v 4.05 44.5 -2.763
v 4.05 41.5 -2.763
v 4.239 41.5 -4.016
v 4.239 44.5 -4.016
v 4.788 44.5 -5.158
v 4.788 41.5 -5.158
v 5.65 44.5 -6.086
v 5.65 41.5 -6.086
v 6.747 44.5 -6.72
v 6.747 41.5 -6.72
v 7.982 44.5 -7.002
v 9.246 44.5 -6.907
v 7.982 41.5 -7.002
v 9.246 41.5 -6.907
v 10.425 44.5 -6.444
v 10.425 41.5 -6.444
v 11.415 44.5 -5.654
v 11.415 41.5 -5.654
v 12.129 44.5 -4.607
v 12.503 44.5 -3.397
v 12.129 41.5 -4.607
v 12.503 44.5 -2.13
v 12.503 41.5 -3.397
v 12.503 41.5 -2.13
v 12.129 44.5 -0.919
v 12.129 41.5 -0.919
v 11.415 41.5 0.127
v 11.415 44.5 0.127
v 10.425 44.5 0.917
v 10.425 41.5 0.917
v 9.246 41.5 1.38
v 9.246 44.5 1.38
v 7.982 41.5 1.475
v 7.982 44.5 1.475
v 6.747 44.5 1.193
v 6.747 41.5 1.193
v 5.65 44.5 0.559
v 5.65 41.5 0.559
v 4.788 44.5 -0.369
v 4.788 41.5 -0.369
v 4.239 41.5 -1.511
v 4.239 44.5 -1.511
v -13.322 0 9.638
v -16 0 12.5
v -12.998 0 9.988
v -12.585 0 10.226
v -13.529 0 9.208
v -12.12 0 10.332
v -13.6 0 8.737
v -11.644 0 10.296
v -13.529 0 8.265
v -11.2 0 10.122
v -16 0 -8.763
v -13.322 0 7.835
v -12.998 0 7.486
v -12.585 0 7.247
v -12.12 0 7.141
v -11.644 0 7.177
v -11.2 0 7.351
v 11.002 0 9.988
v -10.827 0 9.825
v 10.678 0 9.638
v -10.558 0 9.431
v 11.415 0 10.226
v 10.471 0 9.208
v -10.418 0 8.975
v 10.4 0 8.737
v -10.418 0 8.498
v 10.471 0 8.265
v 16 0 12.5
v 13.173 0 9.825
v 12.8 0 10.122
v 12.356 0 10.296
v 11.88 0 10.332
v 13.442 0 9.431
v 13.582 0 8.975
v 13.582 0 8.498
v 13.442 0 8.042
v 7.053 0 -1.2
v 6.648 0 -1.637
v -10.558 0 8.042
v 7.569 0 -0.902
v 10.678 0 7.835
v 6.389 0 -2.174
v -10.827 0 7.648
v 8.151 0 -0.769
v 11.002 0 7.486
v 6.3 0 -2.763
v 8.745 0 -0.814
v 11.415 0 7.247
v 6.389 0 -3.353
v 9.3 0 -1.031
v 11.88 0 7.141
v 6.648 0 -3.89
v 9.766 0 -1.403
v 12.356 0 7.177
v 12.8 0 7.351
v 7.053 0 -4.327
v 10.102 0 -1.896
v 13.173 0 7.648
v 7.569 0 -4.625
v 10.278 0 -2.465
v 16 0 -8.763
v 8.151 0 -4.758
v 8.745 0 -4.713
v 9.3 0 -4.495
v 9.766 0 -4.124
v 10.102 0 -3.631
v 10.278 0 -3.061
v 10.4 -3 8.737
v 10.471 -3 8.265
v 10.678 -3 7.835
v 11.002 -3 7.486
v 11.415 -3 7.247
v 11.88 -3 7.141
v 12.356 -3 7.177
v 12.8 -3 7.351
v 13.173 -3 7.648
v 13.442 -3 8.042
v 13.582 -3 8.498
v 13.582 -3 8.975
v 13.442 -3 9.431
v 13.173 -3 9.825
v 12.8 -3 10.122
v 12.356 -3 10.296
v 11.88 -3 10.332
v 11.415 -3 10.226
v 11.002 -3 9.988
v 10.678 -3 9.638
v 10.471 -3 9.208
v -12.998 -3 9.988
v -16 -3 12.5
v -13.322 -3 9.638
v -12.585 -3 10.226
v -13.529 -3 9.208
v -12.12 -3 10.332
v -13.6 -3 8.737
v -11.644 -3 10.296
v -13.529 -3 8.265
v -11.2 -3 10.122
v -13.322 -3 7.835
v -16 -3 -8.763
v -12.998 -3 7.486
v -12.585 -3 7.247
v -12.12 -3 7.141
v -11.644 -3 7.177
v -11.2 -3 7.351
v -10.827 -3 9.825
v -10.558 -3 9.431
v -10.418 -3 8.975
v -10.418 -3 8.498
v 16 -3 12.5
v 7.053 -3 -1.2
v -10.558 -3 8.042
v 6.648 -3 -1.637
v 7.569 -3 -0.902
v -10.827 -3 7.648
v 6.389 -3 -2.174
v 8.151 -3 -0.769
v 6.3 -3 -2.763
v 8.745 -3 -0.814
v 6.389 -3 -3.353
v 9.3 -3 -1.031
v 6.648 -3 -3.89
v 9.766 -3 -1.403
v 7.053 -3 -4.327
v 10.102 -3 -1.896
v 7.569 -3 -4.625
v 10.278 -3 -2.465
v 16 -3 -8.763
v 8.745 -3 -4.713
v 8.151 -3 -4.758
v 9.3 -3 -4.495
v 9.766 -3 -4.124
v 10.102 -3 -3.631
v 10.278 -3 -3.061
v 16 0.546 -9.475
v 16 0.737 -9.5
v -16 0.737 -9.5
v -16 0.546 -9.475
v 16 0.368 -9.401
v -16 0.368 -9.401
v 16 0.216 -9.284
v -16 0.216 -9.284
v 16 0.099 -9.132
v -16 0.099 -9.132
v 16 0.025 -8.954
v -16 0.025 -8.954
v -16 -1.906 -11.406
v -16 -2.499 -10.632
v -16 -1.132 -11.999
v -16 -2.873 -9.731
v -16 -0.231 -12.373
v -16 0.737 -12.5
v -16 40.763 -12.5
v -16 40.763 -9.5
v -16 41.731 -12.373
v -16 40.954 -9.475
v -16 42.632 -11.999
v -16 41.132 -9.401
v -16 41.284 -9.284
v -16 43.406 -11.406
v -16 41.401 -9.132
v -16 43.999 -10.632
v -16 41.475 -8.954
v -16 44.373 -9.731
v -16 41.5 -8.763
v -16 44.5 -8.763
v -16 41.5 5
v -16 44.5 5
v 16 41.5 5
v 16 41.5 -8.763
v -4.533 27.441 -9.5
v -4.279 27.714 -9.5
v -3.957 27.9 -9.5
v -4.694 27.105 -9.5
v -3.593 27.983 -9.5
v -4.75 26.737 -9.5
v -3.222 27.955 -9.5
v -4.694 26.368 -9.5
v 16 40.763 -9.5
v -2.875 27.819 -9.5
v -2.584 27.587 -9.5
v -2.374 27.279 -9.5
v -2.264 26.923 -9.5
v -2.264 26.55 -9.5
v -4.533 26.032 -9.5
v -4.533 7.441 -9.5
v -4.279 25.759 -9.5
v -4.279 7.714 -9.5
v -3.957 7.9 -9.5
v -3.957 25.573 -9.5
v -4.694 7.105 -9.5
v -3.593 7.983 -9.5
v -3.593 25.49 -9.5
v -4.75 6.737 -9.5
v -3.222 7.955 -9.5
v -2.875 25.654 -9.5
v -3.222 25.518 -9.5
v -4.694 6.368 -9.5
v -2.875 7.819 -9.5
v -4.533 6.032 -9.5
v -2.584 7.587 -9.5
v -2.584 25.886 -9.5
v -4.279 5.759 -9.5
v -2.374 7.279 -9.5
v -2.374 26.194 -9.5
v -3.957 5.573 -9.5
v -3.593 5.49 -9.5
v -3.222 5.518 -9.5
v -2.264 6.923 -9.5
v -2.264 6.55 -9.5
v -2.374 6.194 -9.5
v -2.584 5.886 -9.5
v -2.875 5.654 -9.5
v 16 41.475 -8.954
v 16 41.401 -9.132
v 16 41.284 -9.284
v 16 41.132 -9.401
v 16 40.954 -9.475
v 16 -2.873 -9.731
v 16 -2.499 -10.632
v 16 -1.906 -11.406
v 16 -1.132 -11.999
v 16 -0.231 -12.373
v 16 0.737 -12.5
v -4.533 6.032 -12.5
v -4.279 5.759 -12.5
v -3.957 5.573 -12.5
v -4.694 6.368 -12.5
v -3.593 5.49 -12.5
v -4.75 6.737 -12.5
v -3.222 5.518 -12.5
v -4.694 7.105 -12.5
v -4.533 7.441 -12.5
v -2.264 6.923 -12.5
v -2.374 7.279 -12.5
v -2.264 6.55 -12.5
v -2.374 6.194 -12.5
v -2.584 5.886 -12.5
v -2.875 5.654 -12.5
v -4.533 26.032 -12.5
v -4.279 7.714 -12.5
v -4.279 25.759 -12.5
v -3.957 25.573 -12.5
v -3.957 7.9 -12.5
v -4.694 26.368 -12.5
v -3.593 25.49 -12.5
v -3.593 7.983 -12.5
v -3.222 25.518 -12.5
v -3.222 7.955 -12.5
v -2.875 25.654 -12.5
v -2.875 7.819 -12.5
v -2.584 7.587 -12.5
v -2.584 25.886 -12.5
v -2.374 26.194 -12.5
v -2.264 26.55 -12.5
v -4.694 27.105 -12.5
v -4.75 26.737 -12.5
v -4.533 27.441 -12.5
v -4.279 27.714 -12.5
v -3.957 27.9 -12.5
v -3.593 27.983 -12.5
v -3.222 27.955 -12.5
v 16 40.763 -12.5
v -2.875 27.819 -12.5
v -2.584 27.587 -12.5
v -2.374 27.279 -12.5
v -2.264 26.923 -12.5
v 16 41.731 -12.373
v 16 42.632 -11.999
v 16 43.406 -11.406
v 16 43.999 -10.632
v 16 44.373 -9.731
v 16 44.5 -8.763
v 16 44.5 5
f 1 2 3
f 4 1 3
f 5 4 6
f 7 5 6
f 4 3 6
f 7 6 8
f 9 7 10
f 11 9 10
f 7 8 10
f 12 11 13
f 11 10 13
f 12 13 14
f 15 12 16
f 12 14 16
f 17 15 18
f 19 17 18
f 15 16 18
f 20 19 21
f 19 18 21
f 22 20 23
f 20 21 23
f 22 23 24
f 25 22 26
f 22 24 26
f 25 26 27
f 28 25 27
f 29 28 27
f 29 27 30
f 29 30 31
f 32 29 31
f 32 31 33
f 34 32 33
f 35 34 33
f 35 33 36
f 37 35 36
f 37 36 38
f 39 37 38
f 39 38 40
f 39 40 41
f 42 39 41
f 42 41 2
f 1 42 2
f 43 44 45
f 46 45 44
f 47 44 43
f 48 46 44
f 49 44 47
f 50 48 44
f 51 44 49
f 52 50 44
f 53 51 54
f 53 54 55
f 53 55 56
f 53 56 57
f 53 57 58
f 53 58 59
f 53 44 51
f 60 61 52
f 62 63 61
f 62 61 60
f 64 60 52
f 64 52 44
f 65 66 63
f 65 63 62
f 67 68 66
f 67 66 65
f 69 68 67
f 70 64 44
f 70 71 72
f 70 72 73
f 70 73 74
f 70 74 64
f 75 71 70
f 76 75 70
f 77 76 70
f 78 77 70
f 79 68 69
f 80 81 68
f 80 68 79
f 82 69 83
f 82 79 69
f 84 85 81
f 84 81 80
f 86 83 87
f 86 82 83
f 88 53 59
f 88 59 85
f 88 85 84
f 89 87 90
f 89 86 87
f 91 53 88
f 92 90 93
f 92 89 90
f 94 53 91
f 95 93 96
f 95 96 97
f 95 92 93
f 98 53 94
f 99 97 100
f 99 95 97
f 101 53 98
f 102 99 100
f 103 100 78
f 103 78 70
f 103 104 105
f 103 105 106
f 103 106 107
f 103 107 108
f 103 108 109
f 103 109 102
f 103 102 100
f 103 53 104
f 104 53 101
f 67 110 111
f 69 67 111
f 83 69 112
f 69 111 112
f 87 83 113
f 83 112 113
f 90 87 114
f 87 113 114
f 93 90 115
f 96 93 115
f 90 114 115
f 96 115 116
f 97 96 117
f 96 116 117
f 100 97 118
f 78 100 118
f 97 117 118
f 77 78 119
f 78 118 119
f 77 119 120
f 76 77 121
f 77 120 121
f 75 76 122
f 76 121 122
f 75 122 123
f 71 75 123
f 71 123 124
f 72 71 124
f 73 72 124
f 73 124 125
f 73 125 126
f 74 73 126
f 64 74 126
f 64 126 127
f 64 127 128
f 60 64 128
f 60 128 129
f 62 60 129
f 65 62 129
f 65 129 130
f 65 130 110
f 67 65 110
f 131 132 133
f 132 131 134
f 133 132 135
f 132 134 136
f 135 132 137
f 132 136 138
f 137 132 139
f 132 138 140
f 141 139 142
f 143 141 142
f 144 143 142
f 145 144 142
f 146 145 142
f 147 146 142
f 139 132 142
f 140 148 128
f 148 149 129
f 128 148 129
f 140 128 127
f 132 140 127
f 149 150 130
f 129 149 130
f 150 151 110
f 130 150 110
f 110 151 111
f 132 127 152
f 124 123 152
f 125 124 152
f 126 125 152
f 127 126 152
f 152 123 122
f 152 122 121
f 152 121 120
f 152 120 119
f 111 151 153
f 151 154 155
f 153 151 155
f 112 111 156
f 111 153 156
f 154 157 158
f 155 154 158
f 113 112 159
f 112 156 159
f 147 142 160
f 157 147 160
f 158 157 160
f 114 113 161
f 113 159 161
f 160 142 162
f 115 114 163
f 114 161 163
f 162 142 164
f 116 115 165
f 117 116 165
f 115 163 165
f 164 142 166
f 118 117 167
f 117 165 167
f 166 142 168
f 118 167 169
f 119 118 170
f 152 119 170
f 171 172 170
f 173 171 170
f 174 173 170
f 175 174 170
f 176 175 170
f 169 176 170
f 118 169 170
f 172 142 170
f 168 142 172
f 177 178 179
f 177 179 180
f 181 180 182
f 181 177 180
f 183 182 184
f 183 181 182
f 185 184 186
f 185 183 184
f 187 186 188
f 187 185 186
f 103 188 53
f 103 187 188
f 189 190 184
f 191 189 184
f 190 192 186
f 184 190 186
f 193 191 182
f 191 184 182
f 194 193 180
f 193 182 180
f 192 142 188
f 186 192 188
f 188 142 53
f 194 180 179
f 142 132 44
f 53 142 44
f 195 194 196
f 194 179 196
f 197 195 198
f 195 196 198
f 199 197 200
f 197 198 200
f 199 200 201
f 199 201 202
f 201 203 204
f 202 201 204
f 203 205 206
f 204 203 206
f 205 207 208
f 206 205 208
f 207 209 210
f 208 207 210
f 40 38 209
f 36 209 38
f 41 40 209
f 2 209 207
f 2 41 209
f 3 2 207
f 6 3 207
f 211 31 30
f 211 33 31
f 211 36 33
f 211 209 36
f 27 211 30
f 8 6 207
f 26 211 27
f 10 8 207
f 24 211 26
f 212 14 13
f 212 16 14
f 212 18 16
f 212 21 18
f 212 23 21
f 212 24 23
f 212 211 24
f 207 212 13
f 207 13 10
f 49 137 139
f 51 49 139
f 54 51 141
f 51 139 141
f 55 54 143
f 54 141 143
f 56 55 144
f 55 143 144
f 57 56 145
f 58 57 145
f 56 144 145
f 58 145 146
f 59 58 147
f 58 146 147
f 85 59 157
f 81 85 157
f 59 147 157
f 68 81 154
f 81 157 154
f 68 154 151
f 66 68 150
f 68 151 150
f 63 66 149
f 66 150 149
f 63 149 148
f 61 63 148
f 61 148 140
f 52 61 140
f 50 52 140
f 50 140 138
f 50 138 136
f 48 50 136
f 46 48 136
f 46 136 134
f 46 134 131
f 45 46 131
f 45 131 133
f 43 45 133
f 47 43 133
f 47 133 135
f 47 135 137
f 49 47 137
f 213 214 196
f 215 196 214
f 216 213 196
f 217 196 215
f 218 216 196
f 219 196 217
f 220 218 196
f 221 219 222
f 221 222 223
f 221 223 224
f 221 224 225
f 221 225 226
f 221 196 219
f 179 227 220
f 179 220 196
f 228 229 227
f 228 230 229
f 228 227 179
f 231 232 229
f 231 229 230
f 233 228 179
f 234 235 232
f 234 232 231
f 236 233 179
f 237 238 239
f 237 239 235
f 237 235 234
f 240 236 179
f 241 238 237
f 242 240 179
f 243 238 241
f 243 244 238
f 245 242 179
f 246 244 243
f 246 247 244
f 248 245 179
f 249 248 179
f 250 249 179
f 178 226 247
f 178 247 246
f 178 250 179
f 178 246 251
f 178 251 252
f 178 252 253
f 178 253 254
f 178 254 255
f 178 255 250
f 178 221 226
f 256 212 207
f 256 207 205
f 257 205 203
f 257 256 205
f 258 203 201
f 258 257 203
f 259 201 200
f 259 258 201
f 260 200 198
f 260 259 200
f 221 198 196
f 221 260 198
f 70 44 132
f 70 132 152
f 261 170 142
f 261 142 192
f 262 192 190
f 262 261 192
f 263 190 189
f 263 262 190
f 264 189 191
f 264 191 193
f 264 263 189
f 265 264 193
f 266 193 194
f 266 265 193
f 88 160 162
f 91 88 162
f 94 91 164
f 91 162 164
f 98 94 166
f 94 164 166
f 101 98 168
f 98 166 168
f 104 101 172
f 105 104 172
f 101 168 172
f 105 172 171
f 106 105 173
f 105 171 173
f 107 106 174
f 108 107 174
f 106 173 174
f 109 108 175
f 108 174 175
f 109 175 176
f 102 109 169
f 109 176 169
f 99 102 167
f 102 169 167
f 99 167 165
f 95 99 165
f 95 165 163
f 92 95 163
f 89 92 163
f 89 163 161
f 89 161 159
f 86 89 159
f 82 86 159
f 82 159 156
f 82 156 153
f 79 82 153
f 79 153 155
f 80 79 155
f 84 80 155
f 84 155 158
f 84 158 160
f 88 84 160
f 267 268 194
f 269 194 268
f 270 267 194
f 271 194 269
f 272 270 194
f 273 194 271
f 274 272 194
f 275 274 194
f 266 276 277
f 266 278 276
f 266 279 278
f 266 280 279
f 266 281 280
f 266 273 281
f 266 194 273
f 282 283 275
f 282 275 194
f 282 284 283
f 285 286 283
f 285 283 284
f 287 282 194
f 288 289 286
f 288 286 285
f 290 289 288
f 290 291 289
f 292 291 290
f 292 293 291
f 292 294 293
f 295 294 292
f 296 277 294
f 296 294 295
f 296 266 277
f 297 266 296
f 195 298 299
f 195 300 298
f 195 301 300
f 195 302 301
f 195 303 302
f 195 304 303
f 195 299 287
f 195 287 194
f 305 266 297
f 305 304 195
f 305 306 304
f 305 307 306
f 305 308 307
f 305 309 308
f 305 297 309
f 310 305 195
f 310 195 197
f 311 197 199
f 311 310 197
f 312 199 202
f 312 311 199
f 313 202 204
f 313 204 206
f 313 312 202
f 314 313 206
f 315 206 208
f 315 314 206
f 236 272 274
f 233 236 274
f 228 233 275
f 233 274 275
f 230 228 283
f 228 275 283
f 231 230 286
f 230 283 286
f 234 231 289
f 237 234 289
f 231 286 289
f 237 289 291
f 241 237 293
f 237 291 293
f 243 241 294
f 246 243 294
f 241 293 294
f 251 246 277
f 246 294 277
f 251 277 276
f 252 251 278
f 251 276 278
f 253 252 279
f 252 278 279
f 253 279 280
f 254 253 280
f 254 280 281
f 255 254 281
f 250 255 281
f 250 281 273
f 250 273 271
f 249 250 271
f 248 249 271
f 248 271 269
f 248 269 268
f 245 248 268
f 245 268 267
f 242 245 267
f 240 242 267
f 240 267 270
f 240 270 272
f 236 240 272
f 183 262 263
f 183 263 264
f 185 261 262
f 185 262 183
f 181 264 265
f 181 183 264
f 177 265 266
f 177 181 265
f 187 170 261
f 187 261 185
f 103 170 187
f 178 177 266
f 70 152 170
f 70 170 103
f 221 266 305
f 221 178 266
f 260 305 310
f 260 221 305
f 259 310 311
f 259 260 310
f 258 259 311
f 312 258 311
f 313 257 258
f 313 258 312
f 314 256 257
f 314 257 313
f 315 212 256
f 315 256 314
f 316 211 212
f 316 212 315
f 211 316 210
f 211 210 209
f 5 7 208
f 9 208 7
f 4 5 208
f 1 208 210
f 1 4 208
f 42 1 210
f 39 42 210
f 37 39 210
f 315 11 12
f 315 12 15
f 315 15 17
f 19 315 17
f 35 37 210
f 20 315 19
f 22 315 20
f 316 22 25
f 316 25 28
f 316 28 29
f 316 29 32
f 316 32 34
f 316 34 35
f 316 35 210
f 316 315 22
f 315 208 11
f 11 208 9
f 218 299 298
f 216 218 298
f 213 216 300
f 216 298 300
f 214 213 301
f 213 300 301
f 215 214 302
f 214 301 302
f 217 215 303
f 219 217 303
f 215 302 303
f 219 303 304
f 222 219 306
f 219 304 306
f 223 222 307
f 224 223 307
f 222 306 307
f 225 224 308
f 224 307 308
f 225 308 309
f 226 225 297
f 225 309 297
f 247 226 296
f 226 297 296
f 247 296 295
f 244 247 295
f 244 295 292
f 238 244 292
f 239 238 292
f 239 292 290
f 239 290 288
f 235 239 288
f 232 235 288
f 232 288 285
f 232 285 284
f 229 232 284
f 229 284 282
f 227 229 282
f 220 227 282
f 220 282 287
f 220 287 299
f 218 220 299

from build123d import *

# Parameters (mm, degrees)
SKETCH1_W                        = 32
SKETCH1_H                        = 25
BASE_FLANGE1_DEPTH               = 3
EDGE_FLANGE1_STRIP_W             = 13.4732
EDGE_FLANGE1_STRIP_H             = 3
EDGE_FLANGE1_STRIP_CUT_DEPTH     = 32
EDGE_FLANGE1_DEPTH               = 32
EDGE_FLANGE2_STRIP_W             = 13.4732
EDGE_FLANGE2_STRIP_H             = 3
EDGE_FLANGE2_STRIP_CUT_DEPTH     = 32
EDGE_FLANGE2_DEPTH               = 32
TAP_DRILL_FOR_M3X0_5_TAP1_D      = 2.5
TAP_DRILL_FOR_M10X1_5_TAP2_D     = 8.5
TAP_DRILL_FOR_M10X1_5_TAP2_DEPTH = 3
M3_CLEARANCE_HOLE1_D             = 3.2
F_4_0_4_DIAMETER_HOLE1_D         = 4


# Sheet-metal steps are written as plain solids
with BuildPart() as part:
    # Sketch1 → Base-Flange1 (new body)
    with BuildSketch(Plane(origin=(0, 0, 0), x_dir=(1, 0, 0), z_dir=(0, 1, 0))):
        Rectangle(SKETCH1_W, SKETCH1_H)
    extrude(amount=-BASE_FLANGE1_DEPTH)

    # Edge-Flange1 strip (across the edge) → Edge-Flange1 strip cut (cut)
    with BuildSketch(Plane(origin=(16, 0, -12.5), x_dir=(0, 0, 1), z_dir=(-1, 0, 0))):
        with Locations((-3, -1.5)):
            Rectangle(EDGE_FLANGE1_STRIP_W, EDGE_FLANGE1_STRIP_H)
    extrude(amount=EDGE_FLANGE1_STRIP_CUT_DEPTH, mode=Mode.SUBTRACT)

    # Edge-Flange1 section (across the edge) → Edge-Flange1 (add)
    with BuildSketch(Plane(origin=(16, 0, -12.5), x_dir=(0, 0, 1), z_dir=(-1, 0, 0))):
        with BuildLine():
            Line((0, 0.7366), (0, 44.5))
            Line((0, 44.5), (3, 44.5))
            Line((3, 44.5), (3, 0.7366))
            ThreePointArc((3, 0.7366), (3.215745145, 0.215745145), (3.7366, 0))
            Line((3.7366, 0), (3.7366, -3))
            ThreePointArc((3.7366, -3), (1.094424801, -1.905575199), (0, 0.7366))
        make_face()
    extrude(amount=EDGE_FLANGE1_DEPTH)

    # Edge-Flange2 strip (across the edge) → Edge-Flange2 strip cut (cut)
    with BuildSketch(Plane(origin=(16, 44.5, -9.5), x_dir=(0, -1, 0), z_dir=(-1, 0, 0))):
        with Locations((-3, -1.5)):
            Rectangle(EDGE_FLANGE2_STRIP_W, EDGE_FLANGE2_STRIP_H)
    extrude(amount=EDGE_FLANGE2_STRIP_CUT_DEPTH, mode=Mode.SUBTRACT)

    # Edge-Flange2 section (across the edge) → Edge-Flange2 (add)
    with BuildSketch(Plane(origin=(16, 44.5, -9.5), x_dir=(0, -1, 0), z_dir=(-1, 0, 0))):
        with BuildLine():
            Line((0, 0.7366), (0, 14.5))
            Line((0, 14.5), (3, 14.5))
            Line((3, 14.5), (3, 0.7366))
            ThreePointArc((3, 0.7366), (3.215745145, 0.215745145), (3.7366, 0))
            Line((3.7366, 0), (3.7366, -3))
            ThreePointArc((3.7366, -3), (1.094424801, -1.905575199), (0, 0.7366))
        make_face()
    extrude(amount=EDGE_FLANGE2_DEPTH)

    # Tap Drill for M3x0.5 Tap1 (through all)
    with Locations(Plane.XY.offset(-9.5)):
        with Locations((-3.5, 6.7366), (-3.5, 26.7366)):
            Hole(TAP_DRILL_FOR_M3X0_5_TAP1_D / 2)

    # Tap Drill for M10x1.5 Tap2
    with Locations(Plane(origin=(0, 44.5, 0), x_dir=(1, 0, 0), z_dir=(0, 1, 0))):
        with Locations((8.3, 2.7634)):
            Hole(TAP_DRILL_FOR_M10X1_5_TAP2_D / 2, depth=TAP_DRILL_FOR_M10X1_5_TAP2_DEPTH)

    # M3 Clearance Hole1 (through all)
    with Locations(Plane(origin=(0, 0, 0), x_dir=(1, 0, 0), z_dir=(0, 1, 0))):
        with Locations((-12, -8.7366), (12, -8.7366)):
            Hole(M3_CLEARANCE_HOLE1_D / 2)

    # Ø4.0 (4) Diameter Hole1 (through all)
    with Locations(Plane(origin=(0, 0, 0), x_dir=(1, 0, 0), z_dir=(0, 1, 0))):
        with Locations((8.3, 2.7634)):
            Hole(F_4_0_4_DIAMETER_HOLE1_D / 2)


solid = part.part
